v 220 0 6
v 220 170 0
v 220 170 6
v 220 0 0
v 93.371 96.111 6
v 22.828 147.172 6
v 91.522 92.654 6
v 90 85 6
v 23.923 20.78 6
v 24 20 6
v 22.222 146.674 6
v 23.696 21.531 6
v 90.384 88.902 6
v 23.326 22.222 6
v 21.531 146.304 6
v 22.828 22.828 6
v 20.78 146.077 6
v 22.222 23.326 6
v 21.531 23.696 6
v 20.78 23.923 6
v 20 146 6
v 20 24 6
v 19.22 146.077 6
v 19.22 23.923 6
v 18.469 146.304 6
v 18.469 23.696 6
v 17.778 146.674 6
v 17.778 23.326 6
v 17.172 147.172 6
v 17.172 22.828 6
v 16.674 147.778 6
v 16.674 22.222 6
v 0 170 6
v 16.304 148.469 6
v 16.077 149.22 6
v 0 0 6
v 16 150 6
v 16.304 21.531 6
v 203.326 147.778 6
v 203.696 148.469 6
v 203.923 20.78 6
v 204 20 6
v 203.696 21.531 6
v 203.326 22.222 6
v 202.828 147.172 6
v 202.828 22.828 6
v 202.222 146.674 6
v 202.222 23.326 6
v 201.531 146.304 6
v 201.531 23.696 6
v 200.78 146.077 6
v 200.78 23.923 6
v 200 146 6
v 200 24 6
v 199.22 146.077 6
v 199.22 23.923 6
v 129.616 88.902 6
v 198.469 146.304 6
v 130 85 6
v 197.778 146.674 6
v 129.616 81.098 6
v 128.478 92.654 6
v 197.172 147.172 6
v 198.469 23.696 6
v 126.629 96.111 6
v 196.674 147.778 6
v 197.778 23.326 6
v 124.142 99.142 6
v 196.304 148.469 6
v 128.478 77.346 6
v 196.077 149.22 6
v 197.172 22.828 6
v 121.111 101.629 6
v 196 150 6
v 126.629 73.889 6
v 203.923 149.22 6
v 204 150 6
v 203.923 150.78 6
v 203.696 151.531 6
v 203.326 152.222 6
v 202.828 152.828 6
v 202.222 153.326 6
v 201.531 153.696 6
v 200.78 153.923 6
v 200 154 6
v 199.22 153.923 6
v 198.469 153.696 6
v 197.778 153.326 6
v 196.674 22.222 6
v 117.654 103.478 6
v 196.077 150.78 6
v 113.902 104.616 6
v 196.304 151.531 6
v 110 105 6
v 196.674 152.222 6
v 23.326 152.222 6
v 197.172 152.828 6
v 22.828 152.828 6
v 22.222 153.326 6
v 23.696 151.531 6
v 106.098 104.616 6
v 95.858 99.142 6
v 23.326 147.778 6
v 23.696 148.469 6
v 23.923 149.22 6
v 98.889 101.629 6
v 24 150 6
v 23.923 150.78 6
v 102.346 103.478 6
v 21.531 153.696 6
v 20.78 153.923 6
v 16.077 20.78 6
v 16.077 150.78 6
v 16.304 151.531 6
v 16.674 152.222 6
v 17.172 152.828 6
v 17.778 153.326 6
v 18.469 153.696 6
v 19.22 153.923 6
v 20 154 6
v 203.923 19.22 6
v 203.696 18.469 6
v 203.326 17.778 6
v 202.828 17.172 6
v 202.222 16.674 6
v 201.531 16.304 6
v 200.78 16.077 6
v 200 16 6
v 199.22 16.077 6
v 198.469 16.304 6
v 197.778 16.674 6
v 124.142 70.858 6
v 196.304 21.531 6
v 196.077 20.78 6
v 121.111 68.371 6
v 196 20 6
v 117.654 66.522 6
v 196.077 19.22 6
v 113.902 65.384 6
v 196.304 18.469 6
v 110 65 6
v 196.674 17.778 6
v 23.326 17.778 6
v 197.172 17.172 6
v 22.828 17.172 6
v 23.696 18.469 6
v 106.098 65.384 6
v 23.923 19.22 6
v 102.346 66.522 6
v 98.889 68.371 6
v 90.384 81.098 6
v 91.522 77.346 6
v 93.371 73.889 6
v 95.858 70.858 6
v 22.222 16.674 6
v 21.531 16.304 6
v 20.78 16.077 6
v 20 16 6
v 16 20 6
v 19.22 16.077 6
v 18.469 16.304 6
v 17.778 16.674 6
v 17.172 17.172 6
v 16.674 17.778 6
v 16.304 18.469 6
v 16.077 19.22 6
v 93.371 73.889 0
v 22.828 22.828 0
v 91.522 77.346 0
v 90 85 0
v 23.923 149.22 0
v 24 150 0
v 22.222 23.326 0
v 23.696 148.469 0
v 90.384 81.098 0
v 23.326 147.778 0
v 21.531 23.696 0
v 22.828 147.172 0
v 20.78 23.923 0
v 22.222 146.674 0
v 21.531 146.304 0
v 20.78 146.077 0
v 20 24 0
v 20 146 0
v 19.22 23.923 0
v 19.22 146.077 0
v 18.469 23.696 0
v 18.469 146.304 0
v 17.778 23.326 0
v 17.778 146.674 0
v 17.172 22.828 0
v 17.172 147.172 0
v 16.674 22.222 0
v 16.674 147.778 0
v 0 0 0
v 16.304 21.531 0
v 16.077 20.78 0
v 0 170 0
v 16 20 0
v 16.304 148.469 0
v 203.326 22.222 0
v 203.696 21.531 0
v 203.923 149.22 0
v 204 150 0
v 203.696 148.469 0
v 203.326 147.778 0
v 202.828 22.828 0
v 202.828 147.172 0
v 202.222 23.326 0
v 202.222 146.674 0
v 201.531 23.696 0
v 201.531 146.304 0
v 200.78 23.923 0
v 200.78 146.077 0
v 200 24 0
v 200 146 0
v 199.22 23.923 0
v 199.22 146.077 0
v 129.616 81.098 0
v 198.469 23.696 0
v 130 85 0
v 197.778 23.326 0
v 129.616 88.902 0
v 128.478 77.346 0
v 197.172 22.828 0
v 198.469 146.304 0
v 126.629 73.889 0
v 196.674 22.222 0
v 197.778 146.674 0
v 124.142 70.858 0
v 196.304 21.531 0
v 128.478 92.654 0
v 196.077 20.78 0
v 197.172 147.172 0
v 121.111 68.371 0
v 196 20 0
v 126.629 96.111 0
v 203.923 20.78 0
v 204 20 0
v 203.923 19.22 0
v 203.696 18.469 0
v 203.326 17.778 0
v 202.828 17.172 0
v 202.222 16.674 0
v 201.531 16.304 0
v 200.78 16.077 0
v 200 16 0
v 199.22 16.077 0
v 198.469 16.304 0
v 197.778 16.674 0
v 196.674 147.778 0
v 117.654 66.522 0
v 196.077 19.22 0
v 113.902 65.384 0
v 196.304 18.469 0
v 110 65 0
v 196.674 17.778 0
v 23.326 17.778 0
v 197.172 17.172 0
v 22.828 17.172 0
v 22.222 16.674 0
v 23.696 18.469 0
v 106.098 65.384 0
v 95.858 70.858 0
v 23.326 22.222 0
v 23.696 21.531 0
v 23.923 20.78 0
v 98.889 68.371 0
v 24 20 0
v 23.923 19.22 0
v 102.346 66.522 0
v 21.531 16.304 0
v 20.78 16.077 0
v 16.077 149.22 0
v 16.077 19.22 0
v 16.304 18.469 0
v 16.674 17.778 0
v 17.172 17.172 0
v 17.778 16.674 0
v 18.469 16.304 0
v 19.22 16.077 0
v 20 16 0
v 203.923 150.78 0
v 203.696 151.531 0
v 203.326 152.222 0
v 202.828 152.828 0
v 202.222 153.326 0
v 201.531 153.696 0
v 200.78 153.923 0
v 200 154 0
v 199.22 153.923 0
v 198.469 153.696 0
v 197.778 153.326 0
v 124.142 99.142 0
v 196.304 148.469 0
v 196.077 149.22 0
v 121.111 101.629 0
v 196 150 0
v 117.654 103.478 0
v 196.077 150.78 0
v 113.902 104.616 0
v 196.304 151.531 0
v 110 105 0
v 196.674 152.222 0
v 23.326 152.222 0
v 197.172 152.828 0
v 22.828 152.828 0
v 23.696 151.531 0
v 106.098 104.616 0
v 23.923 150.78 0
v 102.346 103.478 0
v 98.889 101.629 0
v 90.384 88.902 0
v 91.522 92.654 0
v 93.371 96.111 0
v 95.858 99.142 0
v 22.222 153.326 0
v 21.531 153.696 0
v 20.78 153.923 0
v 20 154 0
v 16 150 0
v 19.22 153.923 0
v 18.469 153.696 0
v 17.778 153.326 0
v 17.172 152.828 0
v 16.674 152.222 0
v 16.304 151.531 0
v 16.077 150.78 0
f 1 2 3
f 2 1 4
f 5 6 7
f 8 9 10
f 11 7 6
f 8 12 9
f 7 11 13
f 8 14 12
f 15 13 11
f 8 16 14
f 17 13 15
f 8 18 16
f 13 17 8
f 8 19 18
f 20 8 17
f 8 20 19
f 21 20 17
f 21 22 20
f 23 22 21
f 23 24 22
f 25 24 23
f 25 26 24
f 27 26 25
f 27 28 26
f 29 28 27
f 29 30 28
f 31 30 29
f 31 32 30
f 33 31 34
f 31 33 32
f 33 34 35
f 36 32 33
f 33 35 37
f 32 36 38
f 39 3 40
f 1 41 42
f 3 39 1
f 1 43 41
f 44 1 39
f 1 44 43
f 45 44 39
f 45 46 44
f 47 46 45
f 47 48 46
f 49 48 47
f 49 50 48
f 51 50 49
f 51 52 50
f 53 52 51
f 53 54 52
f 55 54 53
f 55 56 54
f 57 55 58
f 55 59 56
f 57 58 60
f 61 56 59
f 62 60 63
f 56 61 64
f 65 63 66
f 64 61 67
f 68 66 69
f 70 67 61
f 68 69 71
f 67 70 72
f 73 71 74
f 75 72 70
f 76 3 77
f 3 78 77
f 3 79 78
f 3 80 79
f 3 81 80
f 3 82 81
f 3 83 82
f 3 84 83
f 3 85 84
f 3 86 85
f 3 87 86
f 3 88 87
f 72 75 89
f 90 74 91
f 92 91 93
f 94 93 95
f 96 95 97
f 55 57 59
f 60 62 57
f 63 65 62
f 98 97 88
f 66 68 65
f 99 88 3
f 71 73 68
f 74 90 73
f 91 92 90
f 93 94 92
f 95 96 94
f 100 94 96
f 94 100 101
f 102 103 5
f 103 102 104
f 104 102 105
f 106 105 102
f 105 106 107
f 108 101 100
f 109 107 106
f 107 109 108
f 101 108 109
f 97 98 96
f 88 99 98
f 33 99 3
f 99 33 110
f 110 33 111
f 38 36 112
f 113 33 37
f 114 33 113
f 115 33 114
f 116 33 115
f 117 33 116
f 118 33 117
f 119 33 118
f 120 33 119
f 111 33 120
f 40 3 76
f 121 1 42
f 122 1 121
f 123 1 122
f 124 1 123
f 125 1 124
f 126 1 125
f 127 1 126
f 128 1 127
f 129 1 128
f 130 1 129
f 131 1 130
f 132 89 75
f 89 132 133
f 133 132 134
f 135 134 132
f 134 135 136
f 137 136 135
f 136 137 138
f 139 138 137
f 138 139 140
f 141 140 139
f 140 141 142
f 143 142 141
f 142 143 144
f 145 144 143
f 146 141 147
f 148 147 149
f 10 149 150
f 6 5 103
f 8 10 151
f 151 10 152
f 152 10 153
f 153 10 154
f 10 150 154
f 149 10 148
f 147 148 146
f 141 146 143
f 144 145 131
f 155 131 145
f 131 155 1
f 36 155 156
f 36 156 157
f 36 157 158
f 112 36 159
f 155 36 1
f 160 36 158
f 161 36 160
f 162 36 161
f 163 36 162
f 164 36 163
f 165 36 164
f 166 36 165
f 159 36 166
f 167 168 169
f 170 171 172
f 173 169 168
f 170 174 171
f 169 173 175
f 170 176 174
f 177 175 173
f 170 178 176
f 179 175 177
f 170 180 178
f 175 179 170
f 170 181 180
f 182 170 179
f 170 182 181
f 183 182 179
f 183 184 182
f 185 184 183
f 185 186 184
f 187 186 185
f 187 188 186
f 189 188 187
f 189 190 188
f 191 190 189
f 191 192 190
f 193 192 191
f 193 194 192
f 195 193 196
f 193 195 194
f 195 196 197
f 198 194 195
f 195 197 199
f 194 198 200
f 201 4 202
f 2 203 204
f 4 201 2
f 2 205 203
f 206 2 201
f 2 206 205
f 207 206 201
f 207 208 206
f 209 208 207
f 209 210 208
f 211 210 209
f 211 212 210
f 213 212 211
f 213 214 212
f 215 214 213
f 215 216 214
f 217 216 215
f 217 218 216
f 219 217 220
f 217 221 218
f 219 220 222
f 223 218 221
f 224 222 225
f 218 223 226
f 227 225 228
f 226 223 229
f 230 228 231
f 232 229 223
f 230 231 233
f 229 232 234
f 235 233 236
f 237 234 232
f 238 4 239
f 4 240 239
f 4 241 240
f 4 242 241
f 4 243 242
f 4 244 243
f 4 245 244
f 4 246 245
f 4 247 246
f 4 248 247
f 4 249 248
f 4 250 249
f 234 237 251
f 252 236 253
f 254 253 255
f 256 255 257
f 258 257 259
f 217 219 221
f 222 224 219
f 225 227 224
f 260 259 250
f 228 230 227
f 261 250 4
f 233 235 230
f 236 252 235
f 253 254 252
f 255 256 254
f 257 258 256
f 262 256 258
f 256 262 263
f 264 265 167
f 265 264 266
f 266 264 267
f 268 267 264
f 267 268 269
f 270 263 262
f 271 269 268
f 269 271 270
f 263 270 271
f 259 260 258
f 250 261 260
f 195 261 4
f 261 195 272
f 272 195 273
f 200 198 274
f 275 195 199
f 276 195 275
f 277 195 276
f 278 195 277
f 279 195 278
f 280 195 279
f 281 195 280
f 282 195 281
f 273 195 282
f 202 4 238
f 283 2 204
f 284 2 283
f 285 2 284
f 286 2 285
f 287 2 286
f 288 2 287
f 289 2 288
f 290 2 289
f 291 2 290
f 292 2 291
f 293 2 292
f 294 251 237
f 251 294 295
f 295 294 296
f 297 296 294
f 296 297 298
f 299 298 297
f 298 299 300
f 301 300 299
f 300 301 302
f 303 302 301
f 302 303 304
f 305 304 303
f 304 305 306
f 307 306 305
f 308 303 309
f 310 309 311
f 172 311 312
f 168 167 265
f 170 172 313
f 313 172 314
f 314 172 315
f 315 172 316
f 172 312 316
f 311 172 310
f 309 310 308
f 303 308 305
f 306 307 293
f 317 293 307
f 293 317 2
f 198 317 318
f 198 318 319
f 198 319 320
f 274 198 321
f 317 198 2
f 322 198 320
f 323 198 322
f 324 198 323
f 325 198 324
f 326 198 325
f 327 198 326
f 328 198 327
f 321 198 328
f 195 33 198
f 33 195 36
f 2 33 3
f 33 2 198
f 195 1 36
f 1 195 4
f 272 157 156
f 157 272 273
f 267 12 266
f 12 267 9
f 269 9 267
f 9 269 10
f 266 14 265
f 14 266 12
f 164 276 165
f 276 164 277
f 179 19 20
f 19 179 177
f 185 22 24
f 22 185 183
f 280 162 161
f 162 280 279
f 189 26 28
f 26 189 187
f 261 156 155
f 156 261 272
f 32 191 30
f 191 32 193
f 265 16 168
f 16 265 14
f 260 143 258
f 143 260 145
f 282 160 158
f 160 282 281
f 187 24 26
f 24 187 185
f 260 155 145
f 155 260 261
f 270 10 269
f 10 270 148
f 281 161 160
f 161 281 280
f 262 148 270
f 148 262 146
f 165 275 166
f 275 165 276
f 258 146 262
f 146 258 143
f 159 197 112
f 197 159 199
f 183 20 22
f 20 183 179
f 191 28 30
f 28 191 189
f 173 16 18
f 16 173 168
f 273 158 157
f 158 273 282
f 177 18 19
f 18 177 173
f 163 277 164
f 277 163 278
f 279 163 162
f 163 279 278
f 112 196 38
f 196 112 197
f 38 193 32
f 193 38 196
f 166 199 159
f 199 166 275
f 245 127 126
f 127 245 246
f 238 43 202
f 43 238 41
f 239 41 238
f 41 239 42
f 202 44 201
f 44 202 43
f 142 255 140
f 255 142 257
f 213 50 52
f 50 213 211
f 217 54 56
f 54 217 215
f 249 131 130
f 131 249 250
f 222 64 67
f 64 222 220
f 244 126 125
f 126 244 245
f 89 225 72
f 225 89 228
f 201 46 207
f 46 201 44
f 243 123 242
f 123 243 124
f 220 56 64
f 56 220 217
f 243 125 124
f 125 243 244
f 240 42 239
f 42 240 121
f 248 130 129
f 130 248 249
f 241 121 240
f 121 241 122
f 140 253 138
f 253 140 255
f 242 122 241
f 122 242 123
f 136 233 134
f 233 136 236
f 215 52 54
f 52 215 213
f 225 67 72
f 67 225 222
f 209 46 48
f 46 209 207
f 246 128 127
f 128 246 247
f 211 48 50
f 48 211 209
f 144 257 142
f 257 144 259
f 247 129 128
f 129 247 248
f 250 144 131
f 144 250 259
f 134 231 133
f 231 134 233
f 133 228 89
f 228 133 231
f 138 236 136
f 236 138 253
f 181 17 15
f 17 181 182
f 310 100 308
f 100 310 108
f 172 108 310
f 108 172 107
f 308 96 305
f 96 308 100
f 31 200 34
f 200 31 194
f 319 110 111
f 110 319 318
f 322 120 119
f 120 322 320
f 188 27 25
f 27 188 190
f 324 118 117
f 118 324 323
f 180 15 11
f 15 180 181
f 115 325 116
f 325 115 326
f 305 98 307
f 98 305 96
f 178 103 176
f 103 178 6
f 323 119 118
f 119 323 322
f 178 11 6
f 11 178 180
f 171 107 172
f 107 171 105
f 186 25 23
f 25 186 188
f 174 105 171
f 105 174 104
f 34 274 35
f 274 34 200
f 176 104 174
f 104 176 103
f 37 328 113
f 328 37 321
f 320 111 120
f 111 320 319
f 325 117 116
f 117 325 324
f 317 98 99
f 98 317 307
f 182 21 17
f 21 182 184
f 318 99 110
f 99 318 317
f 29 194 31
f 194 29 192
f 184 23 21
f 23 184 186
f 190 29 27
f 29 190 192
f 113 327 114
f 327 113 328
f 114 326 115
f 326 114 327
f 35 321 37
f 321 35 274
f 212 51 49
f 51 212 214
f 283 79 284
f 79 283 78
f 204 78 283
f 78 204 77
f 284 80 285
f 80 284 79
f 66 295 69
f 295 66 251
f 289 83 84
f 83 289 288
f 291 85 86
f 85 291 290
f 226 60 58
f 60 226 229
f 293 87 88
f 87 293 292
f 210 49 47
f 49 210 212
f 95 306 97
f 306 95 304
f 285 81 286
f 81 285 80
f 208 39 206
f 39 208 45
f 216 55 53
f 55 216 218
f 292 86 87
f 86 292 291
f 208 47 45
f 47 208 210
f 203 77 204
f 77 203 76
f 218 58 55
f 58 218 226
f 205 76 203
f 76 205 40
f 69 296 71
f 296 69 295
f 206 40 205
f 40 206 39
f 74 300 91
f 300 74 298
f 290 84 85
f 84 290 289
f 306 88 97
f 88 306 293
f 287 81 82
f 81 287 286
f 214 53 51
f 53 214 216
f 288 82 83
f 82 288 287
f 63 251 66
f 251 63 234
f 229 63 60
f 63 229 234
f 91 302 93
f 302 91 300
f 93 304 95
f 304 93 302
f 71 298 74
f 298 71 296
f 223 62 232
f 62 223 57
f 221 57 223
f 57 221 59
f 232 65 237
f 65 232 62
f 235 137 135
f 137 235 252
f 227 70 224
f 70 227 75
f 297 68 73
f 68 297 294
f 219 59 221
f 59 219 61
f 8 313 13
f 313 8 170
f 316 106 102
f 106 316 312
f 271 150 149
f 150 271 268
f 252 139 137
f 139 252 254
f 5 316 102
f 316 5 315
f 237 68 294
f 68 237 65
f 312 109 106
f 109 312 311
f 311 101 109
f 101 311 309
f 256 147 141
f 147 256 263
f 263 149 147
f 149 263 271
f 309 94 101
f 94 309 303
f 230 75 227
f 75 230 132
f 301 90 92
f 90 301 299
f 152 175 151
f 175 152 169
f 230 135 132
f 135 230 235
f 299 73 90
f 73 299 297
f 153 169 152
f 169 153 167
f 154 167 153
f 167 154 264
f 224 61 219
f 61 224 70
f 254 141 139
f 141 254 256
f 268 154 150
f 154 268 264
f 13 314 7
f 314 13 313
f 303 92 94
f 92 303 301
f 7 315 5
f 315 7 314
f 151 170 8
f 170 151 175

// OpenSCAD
$fn = 32;

// ----------------------------------------------------------------------
// Big plate: 200-250 mm adapter plate
// ----------------------------------------------------------------------

// --- parameters (mm) ---
plate_l = 220;            // plate length, X
plate_w = 170;            // plate width, Y
plate_t = 6;              // plate thickness, Z
corner_d = 8;             // corner hole diameter
corner_in = 20;           // corner hole inset from the edges
bore_d = 40;              // central bore

difference() {
  cube([plate_l, plate_w, plate_t]);
  translate([corner_in, corner_in, -1]) cylinder(h = plate_t + 2, d = corner_d);
  translate([plate_l - corner_in, corner_in, -1]) cylinder(h = plate_t + 2, d = corner_d);
  translate([corner_in, plate_w - corner_in, -1]) cylinder(h = plate_t + 2, d = corner_d);
  translate([plate_l - corner_in, plate_w - corner_in, -1]) cylinder(h = plate_t + 2, d = corner_d);
  translate([plate_l / 2, plate_w / 2, -1]) cylinder(h = plate_t + 2, d = bore_d);
}
